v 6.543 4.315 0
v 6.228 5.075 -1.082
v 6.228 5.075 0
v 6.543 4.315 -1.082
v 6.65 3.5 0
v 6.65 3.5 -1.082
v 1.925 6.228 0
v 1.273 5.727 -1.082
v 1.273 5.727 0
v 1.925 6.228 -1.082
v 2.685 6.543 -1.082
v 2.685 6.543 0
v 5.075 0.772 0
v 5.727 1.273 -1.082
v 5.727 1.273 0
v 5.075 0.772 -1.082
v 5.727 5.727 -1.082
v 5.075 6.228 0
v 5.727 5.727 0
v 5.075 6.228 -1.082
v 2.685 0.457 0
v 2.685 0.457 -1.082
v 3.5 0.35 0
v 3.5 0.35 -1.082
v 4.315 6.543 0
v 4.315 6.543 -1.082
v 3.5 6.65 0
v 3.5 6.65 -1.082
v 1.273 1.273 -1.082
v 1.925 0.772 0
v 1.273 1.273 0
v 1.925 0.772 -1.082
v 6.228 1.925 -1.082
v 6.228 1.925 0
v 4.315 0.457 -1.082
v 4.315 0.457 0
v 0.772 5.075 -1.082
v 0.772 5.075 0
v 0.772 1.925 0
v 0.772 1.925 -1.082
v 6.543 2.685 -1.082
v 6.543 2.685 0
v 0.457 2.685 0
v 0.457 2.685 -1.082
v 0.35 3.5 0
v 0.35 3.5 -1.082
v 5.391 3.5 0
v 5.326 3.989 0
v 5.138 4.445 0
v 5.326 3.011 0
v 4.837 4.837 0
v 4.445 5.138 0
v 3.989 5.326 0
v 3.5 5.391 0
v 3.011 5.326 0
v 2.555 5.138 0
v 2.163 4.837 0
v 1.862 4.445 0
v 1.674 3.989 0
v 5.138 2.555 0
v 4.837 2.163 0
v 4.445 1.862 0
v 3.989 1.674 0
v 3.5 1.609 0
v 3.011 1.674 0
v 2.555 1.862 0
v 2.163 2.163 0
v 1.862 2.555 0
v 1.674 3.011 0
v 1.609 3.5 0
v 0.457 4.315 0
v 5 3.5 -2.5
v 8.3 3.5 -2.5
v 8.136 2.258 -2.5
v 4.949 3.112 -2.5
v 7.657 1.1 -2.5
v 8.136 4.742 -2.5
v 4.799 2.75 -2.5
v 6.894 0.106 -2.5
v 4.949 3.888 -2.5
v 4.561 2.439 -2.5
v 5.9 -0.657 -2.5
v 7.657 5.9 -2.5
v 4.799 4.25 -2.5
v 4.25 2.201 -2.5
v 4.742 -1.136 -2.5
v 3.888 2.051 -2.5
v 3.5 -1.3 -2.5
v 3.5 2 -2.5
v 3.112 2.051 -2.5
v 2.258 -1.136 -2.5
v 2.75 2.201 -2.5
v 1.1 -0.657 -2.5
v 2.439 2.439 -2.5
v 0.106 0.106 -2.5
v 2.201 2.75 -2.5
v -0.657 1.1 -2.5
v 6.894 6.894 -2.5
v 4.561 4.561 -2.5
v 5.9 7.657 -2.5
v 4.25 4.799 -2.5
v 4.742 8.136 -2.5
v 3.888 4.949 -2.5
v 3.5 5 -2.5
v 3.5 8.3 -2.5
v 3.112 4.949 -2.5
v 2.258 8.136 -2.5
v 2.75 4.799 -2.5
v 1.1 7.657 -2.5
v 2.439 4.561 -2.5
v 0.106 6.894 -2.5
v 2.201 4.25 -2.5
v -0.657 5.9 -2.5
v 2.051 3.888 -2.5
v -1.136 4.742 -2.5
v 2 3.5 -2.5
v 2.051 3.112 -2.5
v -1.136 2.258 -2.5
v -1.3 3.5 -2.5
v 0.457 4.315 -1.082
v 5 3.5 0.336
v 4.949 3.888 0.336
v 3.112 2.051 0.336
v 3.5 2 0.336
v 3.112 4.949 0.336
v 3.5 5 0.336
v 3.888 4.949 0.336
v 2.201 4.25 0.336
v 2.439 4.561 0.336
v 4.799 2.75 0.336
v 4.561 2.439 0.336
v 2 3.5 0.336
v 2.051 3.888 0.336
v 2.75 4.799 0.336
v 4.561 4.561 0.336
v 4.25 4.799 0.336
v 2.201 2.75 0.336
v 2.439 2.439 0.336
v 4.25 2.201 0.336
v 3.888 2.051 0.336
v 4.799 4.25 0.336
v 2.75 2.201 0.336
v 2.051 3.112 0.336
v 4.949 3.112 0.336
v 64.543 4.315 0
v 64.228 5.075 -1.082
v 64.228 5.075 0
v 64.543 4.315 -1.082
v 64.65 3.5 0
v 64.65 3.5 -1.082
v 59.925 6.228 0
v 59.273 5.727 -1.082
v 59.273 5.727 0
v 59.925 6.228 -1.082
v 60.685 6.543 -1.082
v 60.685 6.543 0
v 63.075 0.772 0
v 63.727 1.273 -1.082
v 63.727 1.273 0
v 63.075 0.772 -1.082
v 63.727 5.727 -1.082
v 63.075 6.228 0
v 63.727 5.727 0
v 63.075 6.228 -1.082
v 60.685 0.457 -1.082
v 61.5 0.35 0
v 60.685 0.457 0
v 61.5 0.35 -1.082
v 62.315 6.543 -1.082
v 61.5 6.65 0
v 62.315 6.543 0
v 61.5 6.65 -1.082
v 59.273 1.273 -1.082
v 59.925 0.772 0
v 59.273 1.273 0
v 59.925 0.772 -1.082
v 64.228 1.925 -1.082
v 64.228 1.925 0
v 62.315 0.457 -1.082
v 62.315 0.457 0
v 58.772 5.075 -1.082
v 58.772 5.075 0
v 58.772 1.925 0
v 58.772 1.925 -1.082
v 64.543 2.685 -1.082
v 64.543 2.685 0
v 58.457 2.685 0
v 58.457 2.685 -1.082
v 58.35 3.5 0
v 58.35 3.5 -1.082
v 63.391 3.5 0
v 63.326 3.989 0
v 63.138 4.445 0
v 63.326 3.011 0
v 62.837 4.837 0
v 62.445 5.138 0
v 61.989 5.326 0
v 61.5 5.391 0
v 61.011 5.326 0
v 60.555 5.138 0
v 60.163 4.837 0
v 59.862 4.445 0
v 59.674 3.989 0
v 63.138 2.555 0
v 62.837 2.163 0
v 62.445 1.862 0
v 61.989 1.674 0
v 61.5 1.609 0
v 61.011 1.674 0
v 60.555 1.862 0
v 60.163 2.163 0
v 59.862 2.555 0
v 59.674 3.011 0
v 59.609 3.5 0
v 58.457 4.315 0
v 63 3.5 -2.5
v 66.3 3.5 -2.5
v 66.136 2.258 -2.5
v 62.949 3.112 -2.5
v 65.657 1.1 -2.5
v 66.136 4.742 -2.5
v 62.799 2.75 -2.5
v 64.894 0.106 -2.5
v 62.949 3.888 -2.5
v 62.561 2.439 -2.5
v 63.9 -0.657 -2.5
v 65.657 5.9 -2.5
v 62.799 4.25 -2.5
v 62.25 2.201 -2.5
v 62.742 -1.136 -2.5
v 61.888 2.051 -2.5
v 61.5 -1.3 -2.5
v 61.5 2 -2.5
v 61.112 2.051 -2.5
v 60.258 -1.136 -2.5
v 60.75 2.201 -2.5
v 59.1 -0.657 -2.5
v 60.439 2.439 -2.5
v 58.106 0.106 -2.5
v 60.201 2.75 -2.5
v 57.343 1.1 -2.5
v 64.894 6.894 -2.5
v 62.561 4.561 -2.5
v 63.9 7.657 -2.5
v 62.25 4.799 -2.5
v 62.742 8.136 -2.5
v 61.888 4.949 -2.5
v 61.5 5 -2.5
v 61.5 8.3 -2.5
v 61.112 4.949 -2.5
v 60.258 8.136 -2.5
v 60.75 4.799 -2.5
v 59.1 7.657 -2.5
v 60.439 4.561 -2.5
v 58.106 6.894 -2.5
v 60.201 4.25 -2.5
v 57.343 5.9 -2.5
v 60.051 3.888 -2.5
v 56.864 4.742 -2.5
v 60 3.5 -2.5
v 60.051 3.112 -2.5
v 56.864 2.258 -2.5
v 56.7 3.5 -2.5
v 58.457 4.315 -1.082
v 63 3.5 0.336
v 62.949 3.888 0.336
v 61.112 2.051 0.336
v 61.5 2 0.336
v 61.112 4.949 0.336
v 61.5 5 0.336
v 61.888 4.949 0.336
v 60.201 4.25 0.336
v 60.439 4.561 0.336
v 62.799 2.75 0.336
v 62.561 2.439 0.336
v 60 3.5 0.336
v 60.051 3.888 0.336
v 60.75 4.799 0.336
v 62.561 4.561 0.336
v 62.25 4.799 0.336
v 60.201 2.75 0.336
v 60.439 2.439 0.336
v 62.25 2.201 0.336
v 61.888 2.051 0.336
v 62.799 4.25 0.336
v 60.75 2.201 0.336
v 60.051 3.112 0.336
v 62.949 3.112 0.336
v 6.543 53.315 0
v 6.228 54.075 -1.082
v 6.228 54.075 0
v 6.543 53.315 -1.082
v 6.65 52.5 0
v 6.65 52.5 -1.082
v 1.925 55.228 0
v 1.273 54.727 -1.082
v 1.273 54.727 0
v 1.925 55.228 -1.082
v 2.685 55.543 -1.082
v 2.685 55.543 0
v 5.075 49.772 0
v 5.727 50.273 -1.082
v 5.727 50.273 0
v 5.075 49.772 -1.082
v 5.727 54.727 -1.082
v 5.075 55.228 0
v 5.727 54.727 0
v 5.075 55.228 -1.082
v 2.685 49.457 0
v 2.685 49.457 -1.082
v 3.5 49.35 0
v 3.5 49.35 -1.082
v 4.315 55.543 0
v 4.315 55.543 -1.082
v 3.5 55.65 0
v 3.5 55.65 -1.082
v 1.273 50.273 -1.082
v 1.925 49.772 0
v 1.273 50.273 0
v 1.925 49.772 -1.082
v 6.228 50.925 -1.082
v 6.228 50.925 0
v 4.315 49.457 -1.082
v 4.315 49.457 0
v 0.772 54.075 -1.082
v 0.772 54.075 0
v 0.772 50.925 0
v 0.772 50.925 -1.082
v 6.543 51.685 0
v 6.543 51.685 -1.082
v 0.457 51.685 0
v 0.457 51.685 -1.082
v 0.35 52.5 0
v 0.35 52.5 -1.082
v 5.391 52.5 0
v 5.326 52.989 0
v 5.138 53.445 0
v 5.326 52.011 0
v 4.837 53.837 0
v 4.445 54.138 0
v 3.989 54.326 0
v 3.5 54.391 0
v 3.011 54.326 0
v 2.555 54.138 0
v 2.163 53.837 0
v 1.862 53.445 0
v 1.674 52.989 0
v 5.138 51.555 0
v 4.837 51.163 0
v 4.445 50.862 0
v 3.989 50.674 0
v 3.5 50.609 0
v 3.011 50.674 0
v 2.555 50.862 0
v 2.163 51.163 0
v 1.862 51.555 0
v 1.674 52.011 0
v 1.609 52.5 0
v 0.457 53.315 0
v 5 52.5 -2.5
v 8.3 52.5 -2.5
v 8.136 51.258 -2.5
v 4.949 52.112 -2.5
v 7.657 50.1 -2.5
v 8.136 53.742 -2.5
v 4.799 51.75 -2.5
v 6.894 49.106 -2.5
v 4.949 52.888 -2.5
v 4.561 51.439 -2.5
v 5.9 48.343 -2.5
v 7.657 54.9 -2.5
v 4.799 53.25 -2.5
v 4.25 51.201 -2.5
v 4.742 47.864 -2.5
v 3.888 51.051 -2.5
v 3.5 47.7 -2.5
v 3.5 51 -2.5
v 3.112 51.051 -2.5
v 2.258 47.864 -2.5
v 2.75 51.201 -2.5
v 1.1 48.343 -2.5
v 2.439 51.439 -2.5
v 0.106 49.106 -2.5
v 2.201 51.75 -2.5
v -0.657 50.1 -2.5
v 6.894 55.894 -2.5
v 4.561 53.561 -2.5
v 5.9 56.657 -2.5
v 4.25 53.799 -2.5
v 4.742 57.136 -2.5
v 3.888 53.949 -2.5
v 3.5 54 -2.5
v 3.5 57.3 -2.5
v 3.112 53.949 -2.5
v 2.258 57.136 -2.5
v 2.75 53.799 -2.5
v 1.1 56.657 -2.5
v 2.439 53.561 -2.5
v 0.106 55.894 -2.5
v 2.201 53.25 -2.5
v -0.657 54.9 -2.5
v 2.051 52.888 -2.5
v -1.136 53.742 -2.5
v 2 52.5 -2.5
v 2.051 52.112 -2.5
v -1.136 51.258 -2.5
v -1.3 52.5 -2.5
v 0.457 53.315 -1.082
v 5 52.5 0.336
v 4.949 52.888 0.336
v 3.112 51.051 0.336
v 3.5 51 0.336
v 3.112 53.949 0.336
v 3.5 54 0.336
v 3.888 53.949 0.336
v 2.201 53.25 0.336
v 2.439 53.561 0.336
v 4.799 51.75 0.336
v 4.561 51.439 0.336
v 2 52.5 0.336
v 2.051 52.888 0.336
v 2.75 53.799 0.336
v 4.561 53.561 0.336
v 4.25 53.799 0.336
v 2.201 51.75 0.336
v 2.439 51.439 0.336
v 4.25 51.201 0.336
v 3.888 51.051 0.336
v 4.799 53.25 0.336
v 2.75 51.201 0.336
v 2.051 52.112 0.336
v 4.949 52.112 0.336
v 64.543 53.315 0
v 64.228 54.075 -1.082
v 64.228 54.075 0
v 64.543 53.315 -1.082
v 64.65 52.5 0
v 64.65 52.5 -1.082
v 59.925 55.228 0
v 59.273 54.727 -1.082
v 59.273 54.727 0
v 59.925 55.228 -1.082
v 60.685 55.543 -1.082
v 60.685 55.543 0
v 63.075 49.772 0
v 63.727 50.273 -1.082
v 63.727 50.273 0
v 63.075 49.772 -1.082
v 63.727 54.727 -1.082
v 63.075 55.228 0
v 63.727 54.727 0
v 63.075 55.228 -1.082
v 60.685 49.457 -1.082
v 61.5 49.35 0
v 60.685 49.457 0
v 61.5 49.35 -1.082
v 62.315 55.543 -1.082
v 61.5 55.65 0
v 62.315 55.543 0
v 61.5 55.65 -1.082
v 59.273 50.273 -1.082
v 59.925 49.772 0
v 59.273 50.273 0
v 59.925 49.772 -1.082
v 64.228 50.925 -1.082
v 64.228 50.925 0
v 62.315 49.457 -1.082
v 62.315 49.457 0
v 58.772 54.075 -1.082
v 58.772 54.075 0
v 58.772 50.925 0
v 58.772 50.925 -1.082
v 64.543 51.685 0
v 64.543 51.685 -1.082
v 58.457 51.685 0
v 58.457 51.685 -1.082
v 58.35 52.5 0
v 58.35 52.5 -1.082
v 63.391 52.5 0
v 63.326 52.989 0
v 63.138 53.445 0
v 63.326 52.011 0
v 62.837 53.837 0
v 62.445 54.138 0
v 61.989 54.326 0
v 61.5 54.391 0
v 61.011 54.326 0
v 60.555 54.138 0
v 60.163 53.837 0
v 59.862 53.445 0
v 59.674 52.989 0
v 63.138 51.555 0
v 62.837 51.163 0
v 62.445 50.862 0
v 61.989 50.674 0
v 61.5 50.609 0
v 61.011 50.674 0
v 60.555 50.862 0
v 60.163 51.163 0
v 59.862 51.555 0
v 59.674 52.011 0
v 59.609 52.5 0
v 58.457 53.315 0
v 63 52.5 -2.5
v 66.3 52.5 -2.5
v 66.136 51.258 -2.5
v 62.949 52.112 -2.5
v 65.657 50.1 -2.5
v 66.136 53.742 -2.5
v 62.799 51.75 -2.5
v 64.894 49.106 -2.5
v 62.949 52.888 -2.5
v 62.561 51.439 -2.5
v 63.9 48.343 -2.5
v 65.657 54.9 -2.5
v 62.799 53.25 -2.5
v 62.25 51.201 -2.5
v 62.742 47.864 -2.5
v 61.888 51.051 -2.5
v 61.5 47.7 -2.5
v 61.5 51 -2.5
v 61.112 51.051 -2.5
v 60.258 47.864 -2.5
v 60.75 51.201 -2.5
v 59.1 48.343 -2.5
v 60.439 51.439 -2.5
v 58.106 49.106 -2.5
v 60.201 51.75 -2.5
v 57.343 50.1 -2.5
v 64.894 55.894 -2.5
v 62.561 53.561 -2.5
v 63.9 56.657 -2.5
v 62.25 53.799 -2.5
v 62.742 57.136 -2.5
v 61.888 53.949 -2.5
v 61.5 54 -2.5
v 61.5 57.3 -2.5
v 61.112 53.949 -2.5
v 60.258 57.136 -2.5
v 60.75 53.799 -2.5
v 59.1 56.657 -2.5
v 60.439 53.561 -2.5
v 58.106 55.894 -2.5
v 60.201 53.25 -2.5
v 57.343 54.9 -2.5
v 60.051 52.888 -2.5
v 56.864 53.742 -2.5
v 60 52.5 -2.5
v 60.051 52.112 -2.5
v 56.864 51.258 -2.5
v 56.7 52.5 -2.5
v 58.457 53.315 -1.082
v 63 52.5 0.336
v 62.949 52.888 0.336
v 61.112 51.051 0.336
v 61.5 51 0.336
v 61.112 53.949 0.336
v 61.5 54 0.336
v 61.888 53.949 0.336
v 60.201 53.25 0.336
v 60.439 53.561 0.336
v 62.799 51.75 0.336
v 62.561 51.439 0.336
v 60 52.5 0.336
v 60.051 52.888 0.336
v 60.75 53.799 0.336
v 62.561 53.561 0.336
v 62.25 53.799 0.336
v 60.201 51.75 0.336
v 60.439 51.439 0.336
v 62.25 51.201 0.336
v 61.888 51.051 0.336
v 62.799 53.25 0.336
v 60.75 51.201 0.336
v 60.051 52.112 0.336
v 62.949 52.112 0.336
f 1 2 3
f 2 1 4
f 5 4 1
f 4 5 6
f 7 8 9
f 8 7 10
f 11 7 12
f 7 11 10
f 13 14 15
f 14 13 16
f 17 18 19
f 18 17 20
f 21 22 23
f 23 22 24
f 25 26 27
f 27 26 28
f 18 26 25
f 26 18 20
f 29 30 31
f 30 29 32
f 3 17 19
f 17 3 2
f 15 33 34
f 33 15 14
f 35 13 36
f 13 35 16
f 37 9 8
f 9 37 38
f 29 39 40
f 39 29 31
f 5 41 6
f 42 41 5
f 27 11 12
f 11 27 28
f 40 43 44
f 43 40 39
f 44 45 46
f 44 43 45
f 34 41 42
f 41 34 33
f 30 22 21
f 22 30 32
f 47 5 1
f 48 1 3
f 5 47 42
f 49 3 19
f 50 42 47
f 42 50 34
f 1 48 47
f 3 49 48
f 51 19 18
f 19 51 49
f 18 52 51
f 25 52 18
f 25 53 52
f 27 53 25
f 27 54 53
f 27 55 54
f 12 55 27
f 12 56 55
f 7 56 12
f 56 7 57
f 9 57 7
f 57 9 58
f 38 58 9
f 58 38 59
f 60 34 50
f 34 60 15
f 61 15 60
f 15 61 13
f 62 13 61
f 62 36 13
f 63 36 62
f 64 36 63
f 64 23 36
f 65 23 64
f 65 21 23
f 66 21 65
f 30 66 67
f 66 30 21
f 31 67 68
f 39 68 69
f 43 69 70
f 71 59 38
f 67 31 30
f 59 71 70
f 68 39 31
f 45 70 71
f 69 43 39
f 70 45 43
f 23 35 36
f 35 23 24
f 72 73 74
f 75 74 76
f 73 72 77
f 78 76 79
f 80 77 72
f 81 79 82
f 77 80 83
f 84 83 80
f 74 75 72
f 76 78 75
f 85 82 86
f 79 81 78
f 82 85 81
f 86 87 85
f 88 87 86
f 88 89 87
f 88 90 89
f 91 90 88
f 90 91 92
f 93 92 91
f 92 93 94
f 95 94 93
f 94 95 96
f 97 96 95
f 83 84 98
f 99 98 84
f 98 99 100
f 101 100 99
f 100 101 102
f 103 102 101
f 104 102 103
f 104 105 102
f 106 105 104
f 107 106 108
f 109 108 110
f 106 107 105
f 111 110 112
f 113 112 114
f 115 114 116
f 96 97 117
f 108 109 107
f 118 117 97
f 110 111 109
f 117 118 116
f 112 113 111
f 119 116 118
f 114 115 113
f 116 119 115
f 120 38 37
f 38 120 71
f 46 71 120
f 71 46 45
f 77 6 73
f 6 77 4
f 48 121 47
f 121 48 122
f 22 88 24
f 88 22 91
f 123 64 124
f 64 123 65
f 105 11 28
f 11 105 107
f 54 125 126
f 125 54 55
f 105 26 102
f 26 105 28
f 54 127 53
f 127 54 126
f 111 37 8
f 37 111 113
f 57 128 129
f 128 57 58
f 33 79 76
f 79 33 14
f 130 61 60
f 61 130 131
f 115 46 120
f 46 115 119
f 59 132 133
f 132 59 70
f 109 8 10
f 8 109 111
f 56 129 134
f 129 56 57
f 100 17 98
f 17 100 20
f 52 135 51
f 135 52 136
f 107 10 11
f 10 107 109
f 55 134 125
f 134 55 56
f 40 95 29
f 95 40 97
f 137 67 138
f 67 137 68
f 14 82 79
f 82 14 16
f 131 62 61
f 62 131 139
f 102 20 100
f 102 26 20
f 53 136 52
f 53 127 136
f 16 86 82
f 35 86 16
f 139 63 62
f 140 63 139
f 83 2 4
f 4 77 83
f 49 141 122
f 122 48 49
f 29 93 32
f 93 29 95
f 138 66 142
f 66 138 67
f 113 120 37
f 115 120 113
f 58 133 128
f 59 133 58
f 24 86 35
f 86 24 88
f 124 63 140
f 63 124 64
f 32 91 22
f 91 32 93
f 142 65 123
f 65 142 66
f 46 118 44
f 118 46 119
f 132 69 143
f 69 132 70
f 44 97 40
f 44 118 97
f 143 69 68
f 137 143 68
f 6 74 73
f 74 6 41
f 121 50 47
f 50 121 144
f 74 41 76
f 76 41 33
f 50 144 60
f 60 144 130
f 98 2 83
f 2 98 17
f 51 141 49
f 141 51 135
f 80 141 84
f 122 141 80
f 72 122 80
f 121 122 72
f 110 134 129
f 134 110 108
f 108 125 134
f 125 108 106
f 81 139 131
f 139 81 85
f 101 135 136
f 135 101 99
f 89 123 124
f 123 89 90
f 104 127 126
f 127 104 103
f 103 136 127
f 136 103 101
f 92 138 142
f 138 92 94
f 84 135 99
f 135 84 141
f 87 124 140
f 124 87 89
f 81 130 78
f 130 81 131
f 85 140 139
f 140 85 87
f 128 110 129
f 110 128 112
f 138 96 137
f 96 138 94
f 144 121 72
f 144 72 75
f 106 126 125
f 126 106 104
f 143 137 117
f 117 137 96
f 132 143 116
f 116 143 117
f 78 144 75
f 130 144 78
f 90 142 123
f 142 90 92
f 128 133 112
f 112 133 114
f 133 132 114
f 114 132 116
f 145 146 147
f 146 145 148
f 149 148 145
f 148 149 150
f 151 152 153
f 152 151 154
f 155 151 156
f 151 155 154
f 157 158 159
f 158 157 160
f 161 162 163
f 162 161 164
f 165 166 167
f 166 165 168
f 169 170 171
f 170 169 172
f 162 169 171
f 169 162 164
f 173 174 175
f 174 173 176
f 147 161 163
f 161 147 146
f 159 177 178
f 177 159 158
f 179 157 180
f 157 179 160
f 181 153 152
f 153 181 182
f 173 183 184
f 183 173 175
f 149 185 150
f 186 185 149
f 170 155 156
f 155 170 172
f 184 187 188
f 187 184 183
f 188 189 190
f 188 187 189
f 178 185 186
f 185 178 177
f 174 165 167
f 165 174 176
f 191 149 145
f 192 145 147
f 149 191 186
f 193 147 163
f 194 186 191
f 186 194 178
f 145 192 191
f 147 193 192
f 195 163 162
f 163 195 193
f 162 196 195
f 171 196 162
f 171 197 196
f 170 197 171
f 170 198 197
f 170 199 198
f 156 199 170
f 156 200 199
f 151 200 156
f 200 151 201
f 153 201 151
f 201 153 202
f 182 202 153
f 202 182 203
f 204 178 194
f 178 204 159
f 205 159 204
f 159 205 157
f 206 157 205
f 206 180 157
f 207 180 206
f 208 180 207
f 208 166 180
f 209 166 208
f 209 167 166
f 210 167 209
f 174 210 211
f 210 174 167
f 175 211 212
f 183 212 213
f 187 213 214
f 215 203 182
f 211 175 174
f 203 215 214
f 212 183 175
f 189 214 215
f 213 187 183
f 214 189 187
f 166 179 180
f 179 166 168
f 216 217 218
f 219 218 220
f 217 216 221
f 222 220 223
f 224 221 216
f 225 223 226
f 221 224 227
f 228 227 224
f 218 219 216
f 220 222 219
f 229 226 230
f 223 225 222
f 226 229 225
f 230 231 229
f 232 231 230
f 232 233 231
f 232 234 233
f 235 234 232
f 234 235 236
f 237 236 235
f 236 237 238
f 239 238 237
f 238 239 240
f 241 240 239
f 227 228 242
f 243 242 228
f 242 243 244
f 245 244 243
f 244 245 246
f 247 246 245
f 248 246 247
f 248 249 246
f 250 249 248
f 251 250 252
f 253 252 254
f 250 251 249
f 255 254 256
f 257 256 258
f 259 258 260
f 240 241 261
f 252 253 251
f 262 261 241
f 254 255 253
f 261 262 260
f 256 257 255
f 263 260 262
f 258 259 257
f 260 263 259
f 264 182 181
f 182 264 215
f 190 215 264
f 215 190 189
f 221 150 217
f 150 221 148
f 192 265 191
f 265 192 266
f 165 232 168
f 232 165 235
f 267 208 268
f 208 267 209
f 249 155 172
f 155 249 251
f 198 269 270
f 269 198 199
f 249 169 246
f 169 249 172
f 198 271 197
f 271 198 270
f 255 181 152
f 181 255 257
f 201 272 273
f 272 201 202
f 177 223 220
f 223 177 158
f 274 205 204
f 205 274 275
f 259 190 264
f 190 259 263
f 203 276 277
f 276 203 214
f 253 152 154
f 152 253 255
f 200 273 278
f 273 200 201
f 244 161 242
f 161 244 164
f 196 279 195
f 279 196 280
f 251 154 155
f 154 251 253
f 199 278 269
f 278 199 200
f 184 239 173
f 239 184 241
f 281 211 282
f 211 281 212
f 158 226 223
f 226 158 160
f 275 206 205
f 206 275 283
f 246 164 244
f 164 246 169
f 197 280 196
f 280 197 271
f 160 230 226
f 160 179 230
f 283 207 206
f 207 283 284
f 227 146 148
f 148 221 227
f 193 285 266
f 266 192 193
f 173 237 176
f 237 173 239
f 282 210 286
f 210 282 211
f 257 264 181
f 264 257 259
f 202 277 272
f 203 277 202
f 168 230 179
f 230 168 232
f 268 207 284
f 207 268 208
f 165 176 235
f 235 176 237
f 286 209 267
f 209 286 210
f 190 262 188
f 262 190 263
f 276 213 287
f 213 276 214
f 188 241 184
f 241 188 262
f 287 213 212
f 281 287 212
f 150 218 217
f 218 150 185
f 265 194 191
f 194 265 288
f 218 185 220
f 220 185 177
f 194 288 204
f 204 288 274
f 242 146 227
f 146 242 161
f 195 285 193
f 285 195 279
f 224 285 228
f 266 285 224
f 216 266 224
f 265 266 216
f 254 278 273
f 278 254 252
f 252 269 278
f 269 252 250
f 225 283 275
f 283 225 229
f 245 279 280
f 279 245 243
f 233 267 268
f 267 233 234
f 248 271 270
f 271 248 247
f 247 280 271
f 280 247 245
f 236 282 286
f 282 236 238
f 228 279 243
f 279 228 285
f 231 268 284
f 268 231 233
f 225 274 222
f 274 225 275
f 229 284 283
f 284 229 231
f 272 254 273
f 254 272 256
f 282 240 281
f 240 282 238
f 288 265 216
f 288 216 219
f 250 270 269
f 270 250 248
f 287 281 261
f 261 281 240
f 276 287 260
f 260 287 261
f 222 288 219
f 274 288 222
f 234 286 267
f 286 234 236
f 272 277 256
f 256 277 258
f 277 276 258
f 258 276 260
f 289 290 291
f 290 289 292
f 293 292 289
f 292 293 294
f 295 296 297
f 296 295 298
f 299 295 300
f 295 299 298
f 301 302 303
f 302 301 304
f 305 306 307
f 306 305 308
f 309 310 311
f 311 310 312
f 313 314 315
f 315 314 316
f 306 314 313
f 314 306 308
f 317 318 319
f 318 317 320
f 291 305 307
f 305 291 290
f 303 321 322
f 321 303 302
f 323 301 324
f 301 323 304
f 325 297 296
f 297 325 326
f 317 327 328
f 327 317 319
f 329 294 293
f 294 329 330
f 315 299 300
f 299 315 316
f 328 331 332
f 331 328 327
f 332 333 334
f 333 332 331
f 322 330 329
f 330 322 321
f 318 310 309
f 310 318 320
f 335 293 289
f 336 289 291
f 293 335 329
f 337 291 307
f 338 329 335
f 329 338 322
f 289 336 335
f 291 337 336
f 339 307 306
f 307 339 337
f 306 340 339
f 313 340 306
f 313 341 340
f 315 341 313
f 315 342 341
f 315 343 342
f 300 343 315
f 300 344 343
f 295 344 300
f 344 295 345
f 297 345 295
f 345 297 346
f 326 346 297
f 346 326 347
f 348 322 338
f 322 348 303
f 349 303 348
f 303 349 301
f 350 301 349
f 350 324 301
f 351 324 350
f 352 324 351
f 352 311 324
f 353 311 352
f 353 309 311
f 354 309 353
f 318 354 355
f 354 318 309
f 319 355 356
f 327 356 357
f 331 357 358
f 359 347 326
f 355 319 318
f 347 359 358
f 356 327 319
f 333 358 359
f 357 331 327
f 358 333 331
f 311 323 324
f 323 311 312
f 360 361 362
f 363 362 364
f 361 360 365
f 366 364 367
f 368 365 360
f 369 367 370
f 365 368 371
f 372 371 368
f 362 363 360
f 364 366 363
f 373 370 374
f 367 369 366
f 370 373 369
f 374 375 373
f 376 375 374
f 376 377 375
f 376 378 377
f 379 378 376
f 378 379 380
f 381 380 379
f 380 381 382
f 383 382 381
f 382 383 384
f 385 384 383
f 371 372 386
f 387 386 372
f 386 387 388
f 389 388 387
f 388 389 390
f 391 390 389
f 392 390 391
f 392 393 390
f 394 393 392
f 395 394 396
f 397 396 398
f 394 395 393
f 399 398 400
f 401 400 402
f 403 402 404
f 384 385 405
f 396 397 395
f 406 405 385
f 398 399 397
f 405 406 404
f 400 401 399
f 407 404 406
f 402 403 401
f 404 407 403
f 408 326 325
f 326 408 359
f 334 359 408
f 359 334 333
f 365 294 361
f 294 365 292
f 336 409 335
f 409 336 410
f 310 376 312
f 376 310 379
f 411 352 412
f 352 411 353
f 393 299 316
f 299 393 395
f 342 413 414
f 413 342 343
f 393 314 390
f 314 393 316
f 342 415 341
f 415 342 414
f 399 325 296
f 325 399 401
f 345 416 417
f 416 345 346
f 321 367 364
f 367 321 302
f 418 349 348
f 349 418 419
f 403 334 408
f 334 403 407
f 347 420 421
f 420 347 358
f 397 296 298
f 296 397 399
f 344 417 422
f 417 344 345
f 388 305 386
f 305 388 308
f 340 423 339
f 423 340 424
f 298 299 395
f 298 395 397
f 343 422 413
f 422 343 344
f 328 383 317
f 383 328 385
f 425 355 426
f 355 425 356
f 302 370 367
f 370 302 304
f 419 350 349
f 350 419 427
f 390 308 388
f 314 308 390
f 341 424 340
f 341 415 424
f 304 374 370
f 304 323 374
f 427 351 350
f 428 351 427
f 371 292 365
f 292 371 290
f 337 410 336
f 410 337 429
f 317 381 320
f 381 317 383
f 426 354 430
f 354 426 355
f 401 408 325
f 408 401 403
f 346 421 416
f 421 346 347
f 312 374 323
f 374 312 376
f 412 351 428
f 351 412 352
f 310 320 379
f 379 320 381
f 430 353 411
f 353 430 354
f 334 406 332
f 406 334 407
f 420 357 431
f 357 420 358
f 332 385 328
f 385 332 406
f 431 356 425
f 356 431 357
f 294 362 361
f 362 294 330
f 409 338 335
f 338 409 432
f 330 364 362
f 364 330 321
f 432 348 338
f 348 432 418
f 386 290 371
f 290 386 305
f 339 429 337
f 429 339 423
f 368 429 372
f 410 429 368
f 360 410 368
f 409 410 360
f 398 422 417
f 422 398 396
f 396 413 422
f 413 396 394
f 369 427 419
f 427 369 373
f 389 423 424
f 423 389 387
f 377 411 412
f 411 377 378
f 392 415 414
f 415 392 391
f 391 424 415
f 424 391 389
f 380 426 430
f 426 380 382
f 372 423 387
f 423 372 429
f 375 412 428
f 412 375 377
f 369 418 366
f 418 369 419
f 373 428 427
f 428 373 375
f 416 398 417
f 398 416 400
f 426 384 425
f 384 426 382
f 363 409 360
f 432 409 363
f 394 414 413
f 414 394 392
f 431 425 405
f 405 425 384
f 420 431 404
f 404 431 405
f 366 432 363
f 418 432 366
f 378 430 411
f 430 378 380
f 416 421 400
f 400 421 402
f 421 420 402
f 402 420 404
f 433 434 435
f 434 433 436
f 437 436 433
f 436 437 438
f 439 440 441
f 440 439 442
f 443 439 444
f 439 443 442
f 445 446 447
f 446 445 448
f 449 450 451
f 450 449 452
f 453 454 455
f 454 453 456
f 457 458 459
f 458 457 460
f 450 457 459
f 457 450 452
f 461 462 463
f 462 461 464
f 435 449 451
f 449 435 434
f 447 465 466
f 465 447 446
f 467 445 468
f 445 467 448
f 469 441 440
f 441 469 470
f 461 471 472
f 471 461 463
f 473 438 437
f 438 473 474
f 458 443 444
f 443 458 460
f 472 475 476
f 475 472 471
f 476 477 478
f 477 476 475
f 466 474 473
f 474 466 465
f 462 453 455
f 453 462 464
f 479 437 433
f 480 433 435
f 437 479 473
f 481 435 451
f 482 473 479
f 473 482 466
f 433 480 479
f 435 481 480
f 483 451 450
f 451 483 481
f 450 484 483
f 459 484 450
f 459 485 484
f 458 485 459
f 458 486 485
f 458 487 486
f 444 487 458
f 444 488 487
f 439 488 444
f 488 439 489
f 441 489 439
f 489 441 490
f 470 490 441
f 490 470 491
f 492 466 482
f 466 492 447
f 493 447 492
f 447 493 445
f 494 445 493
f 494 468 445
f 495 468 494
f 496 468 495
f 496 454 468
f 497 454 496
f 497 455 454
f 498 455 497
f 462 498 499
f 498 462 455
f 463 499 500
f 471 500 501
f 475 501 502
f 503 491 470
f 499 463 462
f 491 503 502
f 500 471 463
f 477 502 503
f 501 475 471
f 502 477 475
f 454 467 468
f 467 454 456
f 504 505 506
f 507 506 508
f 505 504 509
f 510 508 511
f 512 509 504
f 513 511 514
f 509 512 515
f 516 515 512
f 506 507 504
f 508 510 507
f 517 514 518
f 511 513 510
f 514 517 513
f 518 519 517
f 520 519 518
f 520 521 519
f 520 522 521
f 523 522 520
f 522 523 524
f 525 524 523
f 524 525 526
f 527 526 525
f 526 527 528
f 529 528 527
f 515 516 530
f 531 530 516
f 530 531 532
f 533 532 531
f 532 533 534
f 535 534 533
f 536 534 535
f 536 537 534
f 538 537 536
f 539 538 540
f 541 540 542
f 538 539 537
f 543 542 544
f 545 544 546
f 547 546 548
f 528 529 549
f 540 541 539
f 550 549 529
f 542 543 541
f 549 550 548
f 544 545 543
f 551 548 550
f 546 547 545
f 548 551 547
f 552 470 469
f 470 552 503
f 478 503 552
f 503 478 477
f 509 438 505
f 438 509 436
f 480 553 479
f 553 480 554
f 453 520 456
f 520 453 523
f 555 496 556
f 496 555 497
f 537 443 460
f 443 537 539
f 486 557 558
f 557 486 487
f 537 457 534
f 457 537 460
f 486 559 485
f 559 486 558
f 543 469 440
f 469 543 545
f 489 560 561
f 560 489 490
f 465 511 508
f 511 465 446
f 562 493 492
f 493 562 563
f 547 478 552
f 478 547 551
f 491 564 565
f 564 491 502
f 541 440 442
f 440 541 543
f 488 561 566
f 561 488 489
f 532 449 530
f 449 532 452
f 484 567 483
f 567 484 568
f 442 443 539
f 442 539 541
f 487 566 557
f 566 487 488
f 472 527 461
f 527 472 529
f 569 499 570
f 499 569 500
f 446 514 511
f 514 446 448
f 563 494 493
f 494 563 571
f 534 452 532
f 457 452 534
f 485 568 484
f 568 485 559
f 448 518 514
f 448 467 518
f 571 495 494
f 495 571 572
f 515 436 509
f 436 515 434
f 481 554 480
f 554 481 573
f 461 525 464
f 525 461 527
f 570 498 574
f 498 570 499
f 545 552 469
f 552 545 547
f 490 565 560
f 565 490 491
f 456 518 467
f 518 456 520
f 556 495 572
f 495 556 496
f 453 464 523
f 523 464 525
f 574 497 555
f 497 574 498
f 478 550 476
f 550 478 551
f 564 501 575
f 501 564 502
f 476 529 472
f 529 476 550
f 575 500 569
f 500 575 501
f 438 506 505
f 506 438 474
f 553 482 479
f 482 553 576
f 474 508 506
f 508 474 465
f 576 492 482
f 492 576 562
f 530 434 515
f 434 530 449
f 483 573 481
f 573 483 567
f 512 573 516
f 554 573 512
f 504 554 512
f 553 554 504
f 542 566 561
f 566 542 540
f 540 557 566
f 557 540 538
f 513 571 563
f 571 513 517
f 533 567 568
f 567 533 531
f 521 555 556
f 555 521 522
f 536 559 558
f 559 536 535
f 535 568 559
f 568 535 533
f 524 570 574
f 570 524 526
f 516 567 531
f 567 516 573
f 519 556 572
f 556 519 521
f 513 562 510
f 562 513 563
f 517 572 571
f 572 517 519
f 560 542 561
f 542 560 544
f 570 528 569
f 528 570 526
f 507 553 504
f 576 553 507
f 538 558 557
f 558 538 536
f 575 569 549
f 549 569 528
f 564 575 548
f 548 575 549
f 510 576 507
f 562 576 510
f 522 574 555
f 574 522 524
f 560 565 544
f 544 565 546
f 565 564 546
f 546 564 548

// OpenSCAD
//Shut your Pi Hole! 
//An OpenSCAD library to assist with designing Raspberry Pi accessories

//This work is licensed under the Creative Commons Attribution-ShareAlike 4.0 International License. To view a copy of this license, visit http://creativecommons.org/licenses/by-sa/4.0/.
//© 2016 Dale Price

//Pi dimensions sourced from https://www.raspberrypi.org/documentation/hardware/raspberrypi/mechanical/
//Currently supports "1B", "1A+", "1B+", "2B", "3B", "4B", "Zero"

//get vector of [x,y] vectors of locations of mounting holes based on Pi version
function piHoleLocations (board="4B") = 
	(board=="1A+" || board=="1B+" || board=="2B" || board=="3B" || board=="4B") ?
		[[3.5, 3.5], [61.5, 3.5], [3.5, 52.5], [61.5, 52.5]] : //pi 1B+, 2B, 3B, 4B
	(board=="Zero") ?
		[[3.5, 3.5], [61.5, 3.5], [3.5, 26.5], [61.5, 26.5]] : //pi zero
	(board=="1B") ?
		[[80, 43.5], [25, 17.5]] :
	[]; //invalid board

//get vector of [x,y,z] dimensions of board
//	dimensions are for PCB only, not ports or anything else
function piBoardDim (board="4B") =
	(board=="1B" || board=="1B+" || board=="2B" || board=="3B" || board=="4B") ?
		[85, 56, 1.25] :
	(board=="Zero") ?
		[65, 30, 1.25] :
	(board == "1A+") ?
		[65, 56, 1.25] :
	[]; //invalid board

function piRounding (board="4B") =
	(board == "1A+" || board=="1B+" || board=="2B" || board=="3B" || board=="4B" || board=="Zero") ?
		3 :
	(board=="1B") ?
		0 :
	 0; //invalid board
    
//Mounting holes for a Raspberry Pi of the specified version
//	Parameters
//		board: the version of the raspberry pi to generate holes for
//		depth: the depth of the holes in mm
module piHoles (board, depth = 5, preview=true) {
	hd = 2.8; //Diameter of pi mounting holes plus a tiny bit extra to account for shrinkage when 3D printing
    
	//preview of the board itself
	if(preview==true)
		% piBoard(board);
	
	//mounting holes
	for(holePos = piHoleLocations(board)) {
		translate([holePos[0], holePos[1], depth-0.001])
                cylinder(piBoardDim(board)[2] + depth + 0.002, d=hd, false);
	}
}

//	Parameters
//		board: the version of the raspberry pi to generate holes for
//		height: the height of the standoffs in mm
module piStandoffs (board, height = 5, preview=true) {
	hd = 3; // M2.5 insert
    wall=3.3; //standoff wall thickness
    
	//preview of the board itself
	if(preview==true)
		% piBoard(board);
	
	//mounting holes
	for(holePos = piHoleLocations(board)) {
		translate([holePos[0], holePos[1], -height])
                difference(){
                    union() {
                        cylinder(height, d=hd+wall, false);
                        cylinder(wall*1.25, d1=hd+wall*2, d2=0, false);
                    }
                    cylinder(piBoardDim(board)[2] + height*2, d=hd, false);
                }
	}
}

//Preview of board dimensions for Raspberry Pi of the specified version
module piBoard (board) {
    length = piBoardDim(board)[0];
    width = piBoardDim(board)[1];
    height = piBoardDim(board)[2];
    radius = piRounding(board);

    difference() {
        translate([piRounding(board), piRounding(board),0])
            minkowski() {
                cube([length - radius*2, width - radius*2, height-0.1], center=false);
                cylinder(0.1, r=radius, false);
            }
        piHoles(board, height, false);
    }
    
	//warn about possible inaccuracy of boards that don't currently have official documentation
	if(board == "1B") {
		echo("CAUTION: The mounting hole positions for the board you have selected may not be accurate because the Raspberry Pi Foundation does not currently provide official mechanical drawings for it.");
	}
}

//Snap-fit posts for mounting the Raspberry Pi
//	Parameters
//		board: version of the raspberry pi to mount
//		height: height of the top surface of the raspberry pi board off the base of the posts
//		preview: whether or not to show a preview of the board in place
module piPosts(board, height=5, preview=true) {
	piSize = piBoardDim(board);
	piHolePos = piHoleLocations(board);

	module pcbPost(height) {
		cylinder(d=2, h=height);
		cylinder(d1=5, d2=2, h=height - piSize[2] - 0.25);

		translate([0, 0.4, height]) scale([1.1, 1.1, 1]) cylinder(d=2, h=0.5);
	}
	
	for(holePos = piHolePos) {
		translate([holePos[0], holePos[1], 0]) pcbPost(height);
	}

	if(preview==true)
		% translate([0,0,height-piSize[2]]) piBoard(board);
}

//color("DarkGreen", 1, $fn=20) {
//	piBoard("1B");
//    translate([0,70,0]) piBoard("1A+");
//    translate([0,140,0]) piBoard("1B+");
//	translate([100,0,0]) piBoard("2B");
//	translate([100,70,0]) piBoard("Zero");
//    translate([200,0,0]) piBoard("3B");
//    translate([200,70,0]) piBoard("4B");
//}

piStandoffs("4B", height=2.5, preview=true, $fn=24);
